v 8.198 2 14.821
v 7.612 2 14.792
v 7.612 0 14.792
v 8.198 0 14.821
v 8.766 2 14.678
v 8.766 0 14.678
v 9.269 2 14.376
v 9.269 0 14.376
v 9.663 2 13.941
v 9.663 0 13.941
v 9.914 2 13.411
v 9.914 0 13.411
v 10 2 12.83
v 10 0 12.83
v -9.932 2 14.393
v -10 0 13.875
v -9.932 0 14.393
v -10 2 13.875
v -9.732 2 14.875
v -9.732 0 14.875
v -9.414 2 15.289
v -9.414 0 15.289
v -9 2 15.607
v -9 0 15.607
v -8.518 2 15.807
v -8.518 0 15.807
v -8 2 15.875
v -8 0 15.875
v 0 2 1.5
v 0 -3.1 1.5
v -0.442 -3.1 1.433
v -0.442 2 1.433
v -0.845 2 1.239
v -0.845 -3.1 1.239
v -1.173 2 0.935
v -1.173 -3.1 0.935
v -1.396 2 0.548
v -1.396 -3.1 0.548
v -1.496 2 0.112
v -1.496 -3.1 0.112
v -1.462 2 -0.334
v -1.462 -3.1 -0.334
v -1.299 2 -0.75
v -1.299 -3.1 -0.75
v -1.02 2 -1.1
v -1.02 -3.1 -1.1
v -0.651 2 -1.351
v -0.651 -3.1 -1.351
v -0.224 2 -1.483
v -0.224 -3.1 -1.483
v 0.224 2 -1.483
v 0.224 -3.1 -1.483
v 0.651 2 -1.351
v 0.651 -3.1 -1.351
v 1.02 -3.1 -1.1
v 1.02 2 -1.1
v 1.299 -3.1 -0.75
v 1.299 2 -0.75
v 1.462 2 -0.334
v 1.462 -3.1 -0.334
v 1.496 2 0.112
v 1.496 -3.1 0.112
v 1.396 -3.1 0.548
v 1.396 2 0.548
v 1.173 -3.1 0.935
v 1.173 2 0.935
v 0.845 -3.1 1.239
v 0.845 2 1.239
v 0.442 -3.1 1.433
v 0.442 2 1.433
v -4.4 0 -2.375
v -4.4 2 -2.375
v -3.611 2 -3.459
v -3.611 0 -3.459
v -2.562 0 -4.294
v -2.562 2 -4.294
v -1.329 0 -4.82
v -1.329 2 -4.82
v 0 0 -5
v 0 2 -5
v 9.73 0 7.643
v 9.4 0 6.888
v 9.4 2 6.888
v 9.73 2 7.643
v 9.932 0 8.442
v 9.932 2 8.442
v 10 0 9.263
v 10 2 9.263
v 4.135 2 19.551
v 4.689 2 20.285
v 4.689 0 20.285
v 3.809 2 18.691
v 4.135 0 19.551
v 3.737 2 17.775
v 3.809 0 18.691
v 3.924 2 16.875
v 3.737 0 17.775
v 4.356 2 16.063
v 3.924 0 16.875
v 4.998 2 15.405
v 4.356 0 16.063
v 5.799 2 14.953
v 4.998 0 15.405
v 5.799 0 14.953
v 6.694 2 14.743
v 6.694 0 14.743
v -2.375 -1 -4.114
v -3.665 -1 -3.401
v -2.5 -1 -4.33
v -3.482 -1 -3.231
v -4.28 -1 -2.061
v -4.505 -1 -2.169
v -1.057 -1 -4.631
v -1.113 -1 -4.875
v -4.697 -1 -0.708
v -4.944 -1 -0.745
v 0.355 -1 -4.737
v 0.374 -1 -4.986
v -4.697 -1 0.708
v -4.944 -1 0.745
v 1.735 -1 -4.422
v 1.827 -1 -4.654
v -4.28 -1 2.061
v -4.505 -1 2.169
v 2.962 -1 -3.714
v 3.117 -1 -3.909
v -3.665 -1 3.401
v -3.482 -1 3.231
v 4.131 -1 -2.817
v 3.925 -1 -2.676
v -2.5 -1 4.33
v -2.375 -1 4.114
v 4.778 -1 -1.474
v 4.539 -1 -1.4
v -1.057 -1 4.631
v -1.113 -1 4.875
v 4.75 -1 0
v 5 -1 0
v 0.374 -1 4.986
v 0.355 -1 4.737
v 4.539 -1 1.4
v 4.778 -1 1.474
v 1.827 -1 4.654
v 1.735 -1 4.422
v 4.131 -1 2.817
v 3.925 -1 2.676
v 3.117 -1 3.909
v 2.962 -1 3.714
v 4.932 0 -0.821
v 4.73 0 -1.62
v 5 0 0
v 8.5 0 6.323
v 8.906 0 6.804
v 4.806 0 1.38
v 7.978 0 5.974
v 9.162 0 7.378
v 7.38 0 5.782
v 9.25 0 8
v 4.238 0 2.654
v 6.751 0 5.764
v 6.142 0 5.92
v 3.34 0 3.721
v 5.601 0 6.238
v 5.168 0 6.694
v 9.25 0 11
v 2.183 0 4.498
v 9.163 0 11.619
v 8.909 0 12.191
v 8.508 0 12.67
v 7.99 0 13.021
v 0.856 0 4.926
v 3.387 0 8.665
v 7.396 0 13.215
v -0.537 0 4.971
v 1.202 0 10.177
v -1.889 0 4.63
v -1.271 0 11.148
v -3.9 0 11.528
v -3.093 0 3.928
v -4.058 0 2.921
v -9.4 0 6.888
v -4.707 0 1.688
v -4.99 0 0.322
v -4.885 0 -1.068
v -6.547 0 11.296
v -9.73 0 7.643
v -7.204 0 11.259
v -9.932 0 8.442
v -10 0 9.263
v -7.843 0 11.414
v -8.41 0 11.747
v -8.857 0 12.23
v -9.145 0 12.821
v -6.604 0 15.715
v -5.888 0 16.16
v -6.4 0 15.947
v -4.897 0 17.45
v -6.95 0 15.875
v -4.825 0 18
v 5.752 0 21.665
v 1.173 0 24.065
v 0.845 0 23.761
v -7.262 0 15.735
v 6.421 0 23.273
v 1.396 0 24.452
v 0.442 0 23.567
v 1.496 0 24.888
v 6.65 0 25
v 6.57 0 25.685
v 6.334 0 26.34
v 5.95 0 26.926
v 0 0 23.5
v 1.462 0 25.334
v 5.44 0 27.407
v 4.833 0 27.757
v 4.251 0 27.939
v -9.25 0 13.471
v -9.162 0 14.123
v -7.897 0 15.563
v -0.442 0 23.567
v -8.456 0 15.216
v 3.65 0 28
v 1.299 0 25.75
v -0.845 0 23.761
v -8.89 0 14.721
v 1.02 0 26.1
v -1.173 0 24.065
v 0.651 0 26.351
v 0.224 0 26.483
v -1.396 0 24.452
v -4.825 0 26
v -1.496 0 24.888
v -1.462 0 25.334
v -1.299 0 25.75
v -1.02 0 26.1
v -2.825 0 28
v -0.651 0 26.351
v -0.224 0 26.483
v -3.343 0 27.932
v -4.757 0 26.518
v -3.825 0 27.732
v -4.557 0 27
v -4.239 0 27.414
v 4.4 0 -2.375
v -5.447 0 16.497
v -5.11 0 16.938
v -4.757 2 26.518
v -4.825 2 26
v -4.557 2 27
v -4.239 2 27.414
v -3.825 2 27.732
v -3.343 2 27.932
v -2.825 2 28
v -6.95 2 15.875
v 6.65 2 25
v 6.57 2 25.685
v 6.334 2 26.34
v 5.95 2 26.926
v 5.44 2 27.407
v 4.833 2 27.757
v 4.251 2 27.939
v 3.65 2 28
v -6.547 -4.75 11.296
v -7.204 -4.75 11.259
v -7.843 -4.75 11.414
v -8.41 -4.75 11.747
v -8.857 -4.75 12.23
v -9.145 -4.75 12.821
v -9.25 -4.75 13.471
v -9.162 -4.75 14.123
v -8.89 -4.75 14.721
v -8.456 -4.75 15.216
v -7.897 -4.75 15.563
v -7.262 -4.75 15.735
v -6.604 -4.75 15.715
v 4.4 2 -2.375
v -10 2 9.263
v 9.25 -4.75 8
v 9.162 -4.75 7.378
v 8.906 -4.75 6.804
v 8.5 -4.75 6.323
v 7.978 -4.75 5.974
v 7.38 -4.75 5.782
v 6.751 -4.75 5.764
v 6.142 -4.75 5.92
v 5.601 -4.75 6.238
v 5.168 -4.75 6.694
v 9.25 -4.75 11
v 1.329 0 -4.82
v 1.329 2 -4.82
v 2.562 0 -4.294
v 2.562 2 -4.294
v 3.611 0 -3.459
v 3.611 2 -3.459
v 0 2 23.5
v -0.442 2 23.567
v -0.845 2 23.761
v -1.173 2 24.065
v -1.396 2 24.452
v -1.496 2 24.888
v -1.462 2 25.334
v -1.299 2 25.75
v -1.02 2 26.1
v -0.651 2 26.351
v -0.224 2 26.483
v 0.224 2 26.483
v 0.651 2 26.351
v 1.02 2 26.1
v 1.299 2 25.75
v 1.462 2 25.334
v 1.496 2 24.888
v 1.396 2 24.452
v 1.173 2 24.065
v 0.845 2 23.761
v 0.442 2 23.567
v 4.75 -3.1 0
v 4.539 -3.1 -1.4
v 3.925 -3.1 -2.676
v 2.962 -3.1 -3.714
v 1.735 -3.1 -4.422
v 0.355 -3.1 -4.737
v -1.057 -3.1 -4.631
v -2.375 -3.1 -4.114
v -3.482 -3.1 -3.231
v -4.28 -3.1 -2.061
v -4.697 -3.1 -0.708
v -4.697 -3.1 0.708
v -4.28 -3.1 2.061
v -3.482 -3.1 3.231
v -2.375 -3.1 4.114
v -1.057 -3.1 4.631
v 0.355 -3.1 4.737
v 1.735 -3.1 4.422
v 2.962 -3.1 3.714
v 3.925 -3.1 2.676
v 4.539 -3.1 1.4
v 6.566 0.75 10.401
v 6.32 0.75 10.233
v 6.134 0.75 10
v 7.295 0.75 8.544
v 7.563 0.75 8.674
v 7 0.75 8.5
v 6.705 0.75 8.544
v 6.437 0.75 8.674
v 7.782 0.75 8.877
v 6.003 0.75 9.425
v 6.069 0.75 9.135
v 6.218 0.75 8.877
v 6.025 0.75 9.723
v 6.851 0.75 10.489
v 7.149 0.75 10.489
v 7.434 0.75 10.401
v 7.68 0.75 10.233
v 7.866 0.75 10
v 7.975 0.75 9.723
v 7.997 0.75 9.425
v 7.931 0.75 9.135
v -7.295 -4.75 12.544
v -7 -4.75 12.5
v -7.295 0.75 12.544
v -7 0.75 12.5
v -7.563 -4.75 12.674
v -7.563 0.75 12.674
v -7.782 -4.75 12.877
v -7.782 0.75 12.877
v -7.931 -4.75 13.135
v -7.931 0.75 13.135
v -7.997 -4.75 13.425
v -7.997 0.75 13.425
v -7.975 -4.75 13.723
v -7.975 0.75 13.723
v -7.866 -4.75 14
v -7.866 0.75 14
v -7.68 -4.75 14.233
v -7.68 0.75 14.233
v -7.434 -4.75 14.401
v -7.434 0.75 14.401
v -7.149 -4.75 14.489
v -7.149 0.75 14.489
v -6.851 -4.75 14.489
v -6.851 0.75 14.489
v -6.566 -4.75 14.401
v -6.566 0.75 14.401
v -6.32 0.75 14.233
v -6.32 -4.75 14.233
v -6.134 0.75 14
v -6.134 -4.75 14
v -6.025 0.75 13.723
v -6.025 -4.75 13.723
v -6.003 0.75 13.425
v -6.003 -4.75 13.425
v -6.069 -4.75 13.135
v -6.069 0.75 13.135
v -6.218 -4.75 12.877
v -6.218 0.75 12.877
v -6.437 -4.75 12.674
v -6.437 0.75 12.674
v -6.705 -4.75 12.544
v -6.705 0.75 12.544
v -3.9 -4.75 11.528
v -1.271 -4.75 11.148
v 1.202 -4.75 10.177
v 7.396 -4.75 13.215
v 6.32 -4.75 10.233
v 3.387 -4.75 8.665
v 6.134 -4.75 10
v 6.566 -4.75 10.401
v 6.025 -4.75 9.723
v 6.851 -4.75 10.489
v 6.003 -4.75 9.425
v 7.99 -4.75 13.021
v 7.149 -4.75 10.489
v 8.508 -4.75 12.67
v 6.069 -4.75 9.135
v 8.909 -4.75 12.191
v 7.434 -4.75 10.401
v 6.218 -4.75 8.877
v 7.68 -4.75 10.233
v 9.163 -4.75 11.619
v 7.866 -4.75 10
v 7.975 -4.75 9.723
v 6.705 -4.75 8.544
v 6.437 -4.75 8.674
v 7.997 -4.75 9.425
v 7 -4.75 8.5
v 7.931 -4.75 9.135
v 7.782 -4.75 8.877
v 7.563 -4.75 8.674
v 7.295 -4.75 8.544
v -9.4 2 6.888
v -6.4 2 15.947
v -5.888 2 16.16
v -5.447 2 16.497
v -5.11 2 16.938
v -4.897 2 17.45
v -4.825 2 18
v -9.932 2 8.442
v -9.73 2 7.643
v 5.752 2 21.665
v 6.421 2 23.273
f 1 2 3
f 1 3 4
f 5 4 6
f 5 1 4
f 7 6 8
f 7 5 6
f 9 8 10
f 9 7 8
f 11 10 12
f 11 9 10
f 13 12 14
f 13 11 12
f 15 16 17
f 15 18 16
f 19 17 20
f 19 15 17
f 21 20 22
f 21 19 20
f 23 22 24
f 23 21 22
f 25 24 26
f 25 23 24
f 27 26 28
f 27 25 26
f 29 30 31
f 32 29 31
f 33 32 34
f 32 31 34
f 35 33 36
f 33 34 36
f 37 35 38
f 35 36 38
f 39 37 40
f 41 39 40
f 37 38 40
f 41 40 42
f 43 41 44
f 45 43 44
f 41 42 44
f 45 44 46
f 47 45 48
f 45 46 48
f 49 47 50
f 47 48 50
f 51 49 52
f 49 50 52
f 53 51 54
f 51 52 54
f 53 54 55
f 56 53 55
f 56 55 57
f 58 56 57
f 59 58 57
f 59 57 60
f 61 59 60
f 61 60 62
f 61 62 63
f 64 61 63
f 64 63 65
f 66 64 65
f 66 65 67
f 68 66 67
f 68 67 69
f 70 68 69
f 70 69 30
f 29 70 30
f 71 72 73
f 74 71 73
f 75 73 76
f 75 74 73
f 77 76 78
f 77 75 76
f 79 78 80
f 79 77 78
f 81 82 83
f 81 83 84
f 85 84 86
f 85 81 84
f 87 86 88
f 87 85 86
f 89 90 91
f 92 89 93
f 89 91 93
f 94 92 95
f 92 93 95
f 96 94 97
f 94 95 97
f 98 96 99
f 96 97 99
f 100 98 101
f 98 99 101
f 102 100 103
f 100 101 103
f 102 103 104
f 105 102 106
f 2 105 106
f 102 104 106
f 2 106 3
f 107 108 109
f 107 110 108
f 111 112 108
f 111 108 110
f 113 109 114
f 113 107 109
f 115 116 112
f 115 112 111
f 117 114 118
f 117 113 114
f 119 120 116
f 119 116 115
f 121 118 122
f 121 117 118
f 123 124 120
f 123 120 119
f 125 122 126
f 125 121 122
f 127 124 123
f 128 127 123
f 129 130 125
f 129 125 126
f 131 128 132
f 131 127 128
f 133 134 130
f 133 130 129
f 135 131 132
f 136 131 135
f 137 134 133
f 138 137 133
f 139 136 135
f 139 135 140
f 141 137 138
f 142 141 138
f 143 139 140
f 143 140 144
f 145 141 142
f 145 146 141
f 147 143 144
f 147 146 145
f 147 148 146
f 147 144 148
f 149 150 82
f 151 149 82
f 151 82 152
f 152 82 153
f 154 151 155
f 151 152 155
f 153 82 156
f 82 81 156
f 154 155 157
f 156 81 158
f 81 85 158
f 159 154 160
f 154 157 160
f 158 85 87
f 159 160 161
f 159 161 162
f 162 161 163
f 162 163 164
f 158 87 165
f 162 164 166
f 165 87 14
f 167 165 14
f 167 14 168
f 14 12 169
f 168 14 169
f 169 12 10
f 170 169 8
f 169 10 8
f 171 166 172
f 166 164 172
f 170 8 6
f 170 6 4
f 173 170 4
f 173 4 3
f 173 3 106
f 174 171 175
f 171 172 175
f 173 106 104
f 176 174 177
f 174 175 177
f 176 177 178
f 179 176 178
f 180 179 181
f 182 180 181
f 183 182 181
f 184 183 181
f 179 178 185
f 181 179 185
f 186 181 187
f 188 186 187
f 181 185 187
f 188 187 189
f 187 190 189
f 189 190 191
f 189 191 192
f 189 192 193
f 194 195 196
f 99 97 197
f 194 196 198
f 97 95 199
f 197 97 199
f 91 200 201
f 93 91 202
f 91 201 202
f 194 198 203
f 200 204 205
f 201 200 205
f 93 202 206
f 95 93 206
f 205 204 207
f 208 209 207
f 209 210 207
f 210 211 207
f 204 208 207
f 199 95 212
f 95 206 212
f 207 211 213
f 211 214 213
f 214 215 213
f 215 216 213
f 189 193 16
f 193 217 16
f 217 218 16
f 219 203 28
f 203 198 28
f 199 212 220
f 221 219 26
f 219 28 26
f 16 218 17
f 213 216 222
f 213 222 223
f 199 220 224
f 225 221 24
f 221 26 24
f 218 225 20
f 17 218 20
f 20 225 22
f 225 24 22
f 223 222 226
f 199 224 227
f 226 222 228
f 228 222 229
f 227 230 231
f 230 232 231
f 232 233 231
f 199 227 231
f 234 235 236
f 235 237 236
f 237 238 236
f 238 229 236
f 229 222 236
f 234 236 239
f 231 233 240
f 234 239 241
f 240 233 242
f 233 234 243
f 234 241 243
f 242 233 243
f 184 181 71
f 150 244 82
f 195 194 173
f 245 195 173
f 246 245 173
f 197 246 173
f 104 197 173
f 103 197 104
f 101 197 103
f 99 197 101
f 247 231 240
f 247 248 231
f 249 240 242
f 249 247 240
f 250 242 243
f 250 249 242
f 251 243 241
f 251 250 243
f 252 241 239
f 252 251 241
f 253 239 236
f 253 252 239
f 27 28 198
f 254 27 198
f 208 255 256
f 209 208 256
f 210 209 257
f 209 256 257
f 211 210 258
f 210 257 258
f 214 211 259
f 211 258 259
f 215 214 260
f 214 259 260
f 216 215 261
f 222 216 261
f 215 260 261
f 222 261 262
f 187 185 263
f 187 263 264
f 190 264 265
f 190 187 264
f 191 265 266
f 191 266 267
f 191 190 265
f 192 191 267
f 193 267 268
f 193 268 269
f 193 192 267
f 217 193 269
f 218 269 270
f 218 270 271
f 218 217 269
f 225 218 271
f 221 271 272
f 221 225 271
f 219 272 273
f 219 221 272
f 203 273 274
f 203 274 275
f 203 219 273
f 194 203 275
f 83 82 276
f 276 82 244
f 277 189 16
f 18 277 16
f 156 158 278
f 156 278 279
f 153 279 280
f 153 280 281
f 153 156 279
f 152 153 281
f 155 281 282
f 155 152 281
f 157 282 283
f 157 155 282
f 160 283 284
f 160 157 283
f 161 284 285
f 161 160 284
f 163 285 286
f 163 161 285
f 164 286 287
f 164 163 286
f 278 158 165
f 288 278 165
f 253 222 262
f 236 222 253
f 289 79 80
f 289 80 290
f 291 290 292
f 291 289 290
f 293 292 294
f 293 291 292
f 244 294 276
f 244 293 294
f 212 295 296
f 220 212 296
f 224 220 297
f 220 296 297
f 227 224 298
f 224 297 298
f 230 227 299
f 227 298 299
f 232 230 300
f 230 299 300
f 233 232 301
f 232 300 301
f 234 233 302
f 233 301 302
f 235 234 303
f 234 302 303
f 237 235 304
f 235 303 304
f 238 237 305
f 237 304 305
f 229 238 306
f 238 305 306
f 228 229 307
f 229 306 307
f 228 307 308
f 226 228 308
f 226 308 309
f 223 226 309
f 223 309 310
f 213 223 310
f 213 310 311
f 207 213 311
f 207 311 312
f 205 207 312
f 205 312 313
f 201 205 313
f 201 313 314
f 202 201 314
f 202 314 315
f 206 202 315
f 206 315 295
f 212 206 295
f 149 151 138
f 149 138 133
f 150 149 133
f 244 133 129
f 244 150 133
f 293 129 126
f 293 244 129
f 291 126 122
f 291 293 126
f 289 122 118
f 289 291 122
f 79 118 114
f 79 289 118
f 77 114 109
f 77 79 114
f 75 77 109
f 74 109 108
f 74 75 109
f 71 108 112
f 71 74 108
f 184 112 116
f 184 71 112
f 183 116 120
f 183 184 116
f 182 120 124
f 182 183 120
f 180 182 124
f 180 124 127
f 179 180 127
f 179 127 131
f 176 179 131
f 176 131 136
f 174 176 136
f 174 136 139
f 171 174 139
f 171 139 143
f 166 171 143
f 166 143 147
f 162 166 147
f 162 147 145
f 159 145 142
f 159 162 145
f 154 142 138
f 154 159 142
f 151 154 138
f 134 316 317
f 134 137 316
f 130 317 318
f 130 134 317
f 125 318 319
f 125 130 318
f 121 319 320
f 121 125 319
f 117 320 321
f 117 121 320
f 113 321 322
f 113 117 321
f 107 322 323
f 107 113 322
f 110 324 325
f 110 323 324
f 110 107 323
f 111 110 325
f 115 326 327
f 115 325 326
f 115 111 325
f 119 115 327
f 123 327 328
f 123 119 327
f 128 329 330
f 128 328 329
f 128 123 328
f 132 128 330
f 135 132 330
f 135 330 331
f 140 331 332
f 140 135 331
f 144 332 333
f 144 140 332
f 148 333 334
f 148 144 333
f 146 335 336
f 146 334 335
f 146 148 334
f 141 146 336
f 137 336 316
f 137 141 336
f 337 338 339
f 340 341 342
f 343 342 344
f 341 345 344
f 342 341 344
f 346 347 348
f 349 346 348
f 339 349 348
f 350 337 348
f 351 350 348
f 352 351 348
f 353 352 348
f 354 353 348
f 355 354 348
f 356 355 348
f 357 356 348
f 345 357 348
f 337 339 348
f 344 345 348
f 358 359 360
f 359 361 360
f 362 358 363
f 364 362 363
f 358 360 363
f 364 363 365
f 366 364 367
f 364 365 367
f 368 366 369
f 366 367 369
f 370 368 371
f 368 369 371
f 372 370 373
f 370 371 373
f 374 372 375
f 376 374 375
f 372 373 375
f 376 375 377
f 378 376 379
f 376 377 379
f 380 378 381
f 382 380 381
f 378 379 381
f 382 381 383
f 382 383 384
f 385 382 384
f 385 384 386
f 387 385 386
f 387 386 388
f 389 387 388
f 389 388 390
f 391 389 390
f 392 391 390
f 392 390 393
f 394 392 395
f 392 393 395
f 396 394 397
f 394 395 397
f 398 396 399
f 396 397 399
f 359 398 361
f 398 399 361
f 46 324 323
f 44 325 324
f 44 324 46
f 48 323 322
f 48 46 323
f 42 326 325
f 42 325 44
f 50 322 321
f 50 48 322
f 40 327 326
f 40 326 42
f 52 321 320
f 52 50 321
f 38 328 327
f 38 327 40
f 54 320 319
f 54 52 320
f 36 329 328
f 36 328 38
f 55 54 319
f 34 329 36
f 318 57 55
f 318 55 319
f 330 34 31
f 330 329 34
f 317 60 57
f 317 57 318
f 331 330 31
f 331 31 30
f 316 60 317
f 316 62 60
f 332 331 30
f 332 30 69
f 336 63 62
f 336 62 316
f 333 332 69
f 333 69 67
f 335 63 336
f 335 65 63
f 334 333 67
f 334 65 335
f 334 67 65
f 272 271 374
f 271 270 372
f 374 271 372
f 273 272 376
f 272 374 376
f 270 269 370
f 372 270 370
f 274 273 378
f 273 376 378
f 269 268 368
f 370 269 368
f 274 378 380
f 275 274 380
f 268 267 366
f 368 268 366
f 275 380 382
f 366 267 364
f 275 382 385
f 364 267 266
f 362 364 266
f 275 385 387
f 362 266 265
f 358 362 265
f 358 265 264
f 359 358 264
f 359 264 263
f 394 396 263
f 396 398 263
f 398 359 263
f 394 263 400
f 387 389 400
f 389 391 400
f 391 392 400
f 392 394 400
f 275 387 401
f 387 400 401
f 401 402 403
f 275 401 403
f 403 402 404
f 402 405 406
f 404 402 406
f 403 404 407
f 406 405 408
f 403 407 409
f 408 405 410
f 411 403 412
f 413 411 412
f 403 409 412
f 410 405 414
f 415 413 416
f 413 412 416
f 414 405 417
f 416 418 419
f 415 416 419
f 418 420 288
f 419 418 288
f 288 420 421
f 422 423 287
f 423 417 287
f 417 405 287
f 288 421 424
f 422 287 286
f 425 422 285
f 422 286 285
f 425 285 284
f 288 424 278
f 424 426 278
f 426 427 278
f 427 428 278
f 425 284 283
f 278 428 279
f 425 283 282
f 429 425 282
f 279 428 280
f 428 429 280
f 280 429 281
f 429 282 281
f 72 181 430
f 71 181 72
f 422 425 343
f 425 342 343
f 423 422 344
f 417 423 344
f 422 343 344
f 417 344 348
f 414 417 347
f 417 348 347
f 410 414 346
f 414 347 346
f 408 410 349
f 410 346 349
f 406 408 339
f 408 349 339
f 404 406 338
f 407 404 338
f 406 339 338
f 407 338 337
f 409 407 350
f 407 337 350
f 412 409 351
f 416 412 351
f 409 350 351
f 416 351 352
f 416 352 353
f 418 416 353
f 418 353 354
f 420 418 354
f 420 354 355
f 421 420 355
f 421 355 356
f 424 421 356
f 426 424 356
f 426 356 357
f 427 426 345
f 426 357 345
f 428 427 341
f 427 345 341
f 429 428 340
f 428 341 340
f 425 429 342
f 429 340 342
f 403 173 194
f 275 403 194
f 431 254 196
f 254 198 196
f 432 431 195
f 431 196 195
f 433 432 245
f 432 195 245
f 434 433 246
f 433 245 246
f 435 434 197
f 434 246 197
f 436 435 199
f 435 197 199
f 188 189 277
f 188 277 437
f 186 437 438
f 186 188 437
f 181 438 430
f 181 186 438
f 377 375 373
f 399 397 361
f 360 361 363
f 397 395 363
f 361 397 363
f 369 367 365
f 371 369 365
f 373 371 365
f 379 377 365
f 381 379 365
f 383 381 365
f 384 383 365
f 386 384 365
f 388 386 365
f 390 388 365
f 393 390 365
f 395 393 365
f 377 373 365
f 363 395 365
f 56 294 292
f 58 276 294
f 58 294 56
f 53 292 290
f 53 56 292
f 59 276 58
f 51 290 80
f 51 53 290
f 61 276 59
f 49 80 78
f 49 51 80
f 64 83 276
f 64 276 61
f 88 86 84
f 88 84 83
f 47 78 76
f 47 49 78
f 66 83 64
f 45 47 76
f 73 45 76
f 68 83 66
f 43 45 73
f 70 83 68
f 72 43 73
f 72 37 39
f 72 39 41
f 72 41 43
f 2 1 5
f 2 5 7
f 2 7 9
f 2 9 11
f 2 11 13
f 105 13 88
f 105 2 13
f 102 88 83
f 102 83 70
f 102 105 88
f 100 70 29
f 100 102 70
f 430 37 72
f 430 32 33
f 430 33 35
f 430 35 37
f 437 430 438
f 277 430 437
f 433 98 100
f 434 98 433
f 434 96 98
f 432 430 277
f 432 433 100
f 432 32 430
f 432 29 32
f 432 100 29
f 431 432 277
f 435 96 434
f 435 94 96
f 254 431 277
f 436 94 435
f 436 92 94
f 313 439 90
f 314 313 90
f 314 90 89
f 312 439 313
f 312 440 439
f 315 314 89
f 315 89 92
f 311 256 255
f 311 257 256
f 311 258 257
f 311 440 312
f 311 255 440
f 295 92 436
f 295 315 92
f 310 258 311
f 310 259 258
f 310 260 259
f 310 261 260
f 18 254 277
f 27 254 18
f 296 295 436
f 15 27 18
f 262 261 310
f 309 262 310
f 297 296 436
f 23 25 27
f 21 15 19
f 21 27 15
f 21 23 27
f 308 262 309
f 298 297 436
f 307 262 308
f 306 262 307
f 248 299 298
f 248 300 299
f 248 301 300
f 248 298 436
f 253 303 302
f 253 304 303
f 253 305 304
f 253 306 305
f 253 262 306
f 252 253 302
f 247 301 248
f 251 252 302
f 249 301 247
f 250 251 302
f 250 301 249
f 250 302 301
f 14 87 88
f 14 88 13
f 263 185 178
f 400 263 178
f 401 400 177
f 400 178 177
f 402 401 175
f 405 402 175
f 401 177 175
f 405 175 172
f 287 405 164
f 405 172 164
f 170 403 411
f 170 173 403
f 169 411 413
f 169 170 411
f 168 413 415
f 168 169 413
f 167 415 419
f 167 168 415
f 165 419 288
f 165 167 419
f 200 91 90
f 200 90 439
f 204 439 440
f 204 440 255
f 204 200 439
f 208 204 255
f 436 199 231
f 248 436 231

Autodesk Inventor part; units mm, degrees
ref_plane "YZ Plane" through (0, 0, 0) normal (1, 0, 0) x (0, 1, 0)
ref_plane "XZ Plane" through (0, 0, 0) normal (0, 1, 0) x (-1, 0, 0)
ref_plane "XY Plane" through (0, 0, 0) normal (0, 0, 1) x (1, 0, 0)
sketch "Sketch1" plane through (0, 0, 0) normal (0, 1, 0) x (-1, 0, 0)
  arc A0 (0, -5) -> (4.4, -2.3749) centre (0, 0) ccw
  line L0 (0, 0) -> (0, 29.6022) construction
  line L1 (10, 9.2633) -> (10, 13.6302)
  line L2 (2.254, 28) -> (-1.8447, 28)
  line L3 (9.4, 6.8883) -> (4.4, -2.3749)
  arc A1 (9.4, 6.8883) -> (10, 9.2633) centre (5, 9.2633) ccw
  arc A2 (-4.4, -2.3749) -> (0, -5) centre (0, 0) ccw
  line L4 (-10, 9.2633) -> (-10, 23)
  line L5 (-5, 28) -> (-1.8447, 28)
  line L6 (-9.4, 6.8883) -> (-4.4, -2.3749)
  arc A3 (-10, 9.2633) -> (-9.4, 6.8883) centre (-5, 9.2633) ccw
  arc A4 (-5, 28) -> (-10, 23) centre (-5, 23) ccw
  arc A5 (4.825, 18) -> (6.95, 15.875) centre (6.95, 18) ccw
  line L7 (4.825, 18) -> (4.825, 28)
  line L8 (4.825, 28) -> (2.254, 28)
  line L9 (10, 13.6302) -> (10, 15.875)
  line L10 (10, 15.875) -> (6.95, 15.875)
  circle A6 centre (0, 0) radius 5
  point P0 (10, 28)
  point P1 (10, 8)
  point P2 (-10, 28)
  dimension "d0" = 10
  dimension "d3" = 10
  dimension "d4" = 28
  dimension "d26" = 8
  dimension "d27" = 5
  dimension "d48" = 5
  dimension "d51" = 3.05
  dimension "d52" = 10
  dimension "d53" = 4.25
extrude "Extrusion1" add sketch "Sketch1" along normal blind 2
sketch "Sketch3" plane through (0, 2, 0) normal (0, 1, 0) x (1, 0, 0)
  line L0 (0, 0) -> (0, -24.7147) construction
  line L1 (-4.825, -28) -> (5, -28) projected
  arc A0 (9.25, -8) -> (4.75, -8) centre (7, -8) ccw
  circle A1 centre (-7, -13.5) radius 2.25
  line L2 (7, -8) -> (7, -11) construction
  line L3 (9.25, -8) -> (9.25, -11)
  line L4 (4.75, -11) -> (4.75, -8)
  arc A2 (9.25, -8) -> (4.75, -8) centre (7, -8) ccw
  arc A3 (4.75, -11) -> (9.25, -11) centre (7, -11) ccw
  arc A4 (-6.5467, -11.2961) -> (5.1678, -6.694) centre (-4.2232, 0) ccw
  line L5 (7.3955, -13.215) -> (-6.6045, -15.715)
  point P0 (-4, -28)
  point P1 (-2.254, -28)
  point P2 (7, -9.5)
  dimension "d28" = 20
  dimension "d29" = 7
  dimension "d46" = 7
  dimension "d47" = 14.5
  dimension "d96" = 4.5
  dimension "d97" = 4.5
  dimension "d136" = 3
fillet "Fillet1" radius 2 2 edges at (-10, 1, 15.875) (-4.825, 1, 28)
sketch "Sketch4" plane through (0, 0, 0) normal (0, -1, 0) x (1, 0, 0)
  point P0 (0, 0)
  point P1 (0, 25)
  dimension "d37" = 25
hole "Hole4" at (0, 0, 25) direction (0, 1, 0) diameter 3 end through all
sketch "Sketch5" plane through (0, 0, 0) normal (0, -1, 0) x (1, 0, 0)
  circle A0 centre (0, 25) radius 1.5 projected
  circle A1 centre (0, 25) radius 1.5 projected
  arc A2 (-2.825, 28) -> (-4.825, 26) centre (-2.825, 26) ccw projected
  line L0 (-4.825, 26) -> (-4.825, 18) projected
  arc A3 (-6.95, 15.875) -> (-4.825, 18) centre (-6.95, 18) ccw projected
  line L1 (-6.95, 15.875) -> (-8, 15.875) projected
  arc A4 (-8, 15.875) -> (-10, 13.875) centre (-8, 13.875) ccw projected
  line L2 (-10, 13.875) -> (-10, 9.2633) projected
  arc A5 (-10, 9.2633) -> (-9.4, 6.8883) centre (-5, 9.2633) ccw projected
  line L3 (-9.4, 6.8883) -> (-4.4, -2.3749) projected
  arc A6 (-4.4, -2.3749) -> (4.4, -2.3749) centre (0, 0) ccw projected
  line L4 (4.4, -2.3749) -> (9.4, 6.8883) projected
  arc A7 (9.4, 6.8883) -> (10, 9.2633) centre (5, 9.2633) ccw projected
  line L5 (10, 9.2633) -> (10, 23) projected
  arc A8 (10, 23) -> (5, 28) centre (5, 23) ccw projected
  line L6 (5, 28) -> (-2.825, 28) projected
  circle A9 centre (0, 25) radius 9.8995 construction
  line L7 (0, 25) -> (17.632, 25) construction
  line L8 (0, 25) -> (13.9609, 10.961) construction
  arc A10 (4.6888, 20.285) -> (10, 16.7785) centre (6.9804, 17.9805) ccw
  arc A11 (4.6888, 20.285) -> (5.9826, 27.9025) centre (0, 25) ccw
  dimension "d55" = 19.799
  dimension "d56" = 45.16
  dimension "d57" = 6.5
extrude "Extrusion2" cut sketch "Sketch5" against normal through all contours A8 L5 A10 A11
fillet "Fillet2" radius 3 1 edges at (5.9826, 1, 27.9025)
fillet "Fillet3" radius 2 1 edges at (10, 1, 16.7785)
extrude "Extrusion5" add sketch "Sketch3" against normal blind 6.75
sketch "Sketch14" plane through (0, 0, 0) normal (0, -1, 0) x (1, 0, 0)
  circle A0 centre (0, 0) radius 5
  dimension "d123" = 10
extrude "Extrusion6" add sketch "Sketch14" along normal blind 1
sketch "Sketch15" plane through (0, -1, 0) normal (0, -1, 0) x (1, 0, 0)
  circle A0 centre (0, 0) radius 4.75
  dimension "d126" = 9.5
extrude "Extrusion7" add sketch "Sketch15" along normal blind 2.1
sketch "Sketch16" plane through (0, 2, 0) normal (0, 1, 0) x (1, 0, 0)
  point P0 (0, 0)
  point P1 (0, 0)
hole "Hole11" at (0, 2, 0) direction (0, -1, 0) diameter 3 end through all
sketch "Sketch17" plane through (0, -4.75, 0) normal (0, -1, 0) x (1, 0, 0)
  arc A0 (-6.6045, 15.715) -> (-6.5467, 11.2961) centre (-7, 13.5) ccw projected
  arc A1 (5.1678, 6.694) -> (-6.5467, 11.2961) centre (-4.2232, 0) ccw projected
  arc A2 (5.1678, 6.694) -> (9.25, 8) centre (7, 8) ccw projected
  line L0 (9.25, 8) -> (9.25, 11) projected
  arc A3 (9.25, 11) -> (7.3955, 13.215) centre (7, 11) ccw projected
  line L1 (7.3955, 13.215) -> (-6.6045, 15.715) projected
  line L2 (7, 8) -> (7, 11) construction
  point P0 (0, 0)
  point P1 (7, 9.5)
hole "mounting" at (7, -4.75, 9.5) at (-7, -4.75, 13.5) direction (0, 1, 0) diameter 2 depth 5.5
properties part number "phalanx_2_housing_R"
